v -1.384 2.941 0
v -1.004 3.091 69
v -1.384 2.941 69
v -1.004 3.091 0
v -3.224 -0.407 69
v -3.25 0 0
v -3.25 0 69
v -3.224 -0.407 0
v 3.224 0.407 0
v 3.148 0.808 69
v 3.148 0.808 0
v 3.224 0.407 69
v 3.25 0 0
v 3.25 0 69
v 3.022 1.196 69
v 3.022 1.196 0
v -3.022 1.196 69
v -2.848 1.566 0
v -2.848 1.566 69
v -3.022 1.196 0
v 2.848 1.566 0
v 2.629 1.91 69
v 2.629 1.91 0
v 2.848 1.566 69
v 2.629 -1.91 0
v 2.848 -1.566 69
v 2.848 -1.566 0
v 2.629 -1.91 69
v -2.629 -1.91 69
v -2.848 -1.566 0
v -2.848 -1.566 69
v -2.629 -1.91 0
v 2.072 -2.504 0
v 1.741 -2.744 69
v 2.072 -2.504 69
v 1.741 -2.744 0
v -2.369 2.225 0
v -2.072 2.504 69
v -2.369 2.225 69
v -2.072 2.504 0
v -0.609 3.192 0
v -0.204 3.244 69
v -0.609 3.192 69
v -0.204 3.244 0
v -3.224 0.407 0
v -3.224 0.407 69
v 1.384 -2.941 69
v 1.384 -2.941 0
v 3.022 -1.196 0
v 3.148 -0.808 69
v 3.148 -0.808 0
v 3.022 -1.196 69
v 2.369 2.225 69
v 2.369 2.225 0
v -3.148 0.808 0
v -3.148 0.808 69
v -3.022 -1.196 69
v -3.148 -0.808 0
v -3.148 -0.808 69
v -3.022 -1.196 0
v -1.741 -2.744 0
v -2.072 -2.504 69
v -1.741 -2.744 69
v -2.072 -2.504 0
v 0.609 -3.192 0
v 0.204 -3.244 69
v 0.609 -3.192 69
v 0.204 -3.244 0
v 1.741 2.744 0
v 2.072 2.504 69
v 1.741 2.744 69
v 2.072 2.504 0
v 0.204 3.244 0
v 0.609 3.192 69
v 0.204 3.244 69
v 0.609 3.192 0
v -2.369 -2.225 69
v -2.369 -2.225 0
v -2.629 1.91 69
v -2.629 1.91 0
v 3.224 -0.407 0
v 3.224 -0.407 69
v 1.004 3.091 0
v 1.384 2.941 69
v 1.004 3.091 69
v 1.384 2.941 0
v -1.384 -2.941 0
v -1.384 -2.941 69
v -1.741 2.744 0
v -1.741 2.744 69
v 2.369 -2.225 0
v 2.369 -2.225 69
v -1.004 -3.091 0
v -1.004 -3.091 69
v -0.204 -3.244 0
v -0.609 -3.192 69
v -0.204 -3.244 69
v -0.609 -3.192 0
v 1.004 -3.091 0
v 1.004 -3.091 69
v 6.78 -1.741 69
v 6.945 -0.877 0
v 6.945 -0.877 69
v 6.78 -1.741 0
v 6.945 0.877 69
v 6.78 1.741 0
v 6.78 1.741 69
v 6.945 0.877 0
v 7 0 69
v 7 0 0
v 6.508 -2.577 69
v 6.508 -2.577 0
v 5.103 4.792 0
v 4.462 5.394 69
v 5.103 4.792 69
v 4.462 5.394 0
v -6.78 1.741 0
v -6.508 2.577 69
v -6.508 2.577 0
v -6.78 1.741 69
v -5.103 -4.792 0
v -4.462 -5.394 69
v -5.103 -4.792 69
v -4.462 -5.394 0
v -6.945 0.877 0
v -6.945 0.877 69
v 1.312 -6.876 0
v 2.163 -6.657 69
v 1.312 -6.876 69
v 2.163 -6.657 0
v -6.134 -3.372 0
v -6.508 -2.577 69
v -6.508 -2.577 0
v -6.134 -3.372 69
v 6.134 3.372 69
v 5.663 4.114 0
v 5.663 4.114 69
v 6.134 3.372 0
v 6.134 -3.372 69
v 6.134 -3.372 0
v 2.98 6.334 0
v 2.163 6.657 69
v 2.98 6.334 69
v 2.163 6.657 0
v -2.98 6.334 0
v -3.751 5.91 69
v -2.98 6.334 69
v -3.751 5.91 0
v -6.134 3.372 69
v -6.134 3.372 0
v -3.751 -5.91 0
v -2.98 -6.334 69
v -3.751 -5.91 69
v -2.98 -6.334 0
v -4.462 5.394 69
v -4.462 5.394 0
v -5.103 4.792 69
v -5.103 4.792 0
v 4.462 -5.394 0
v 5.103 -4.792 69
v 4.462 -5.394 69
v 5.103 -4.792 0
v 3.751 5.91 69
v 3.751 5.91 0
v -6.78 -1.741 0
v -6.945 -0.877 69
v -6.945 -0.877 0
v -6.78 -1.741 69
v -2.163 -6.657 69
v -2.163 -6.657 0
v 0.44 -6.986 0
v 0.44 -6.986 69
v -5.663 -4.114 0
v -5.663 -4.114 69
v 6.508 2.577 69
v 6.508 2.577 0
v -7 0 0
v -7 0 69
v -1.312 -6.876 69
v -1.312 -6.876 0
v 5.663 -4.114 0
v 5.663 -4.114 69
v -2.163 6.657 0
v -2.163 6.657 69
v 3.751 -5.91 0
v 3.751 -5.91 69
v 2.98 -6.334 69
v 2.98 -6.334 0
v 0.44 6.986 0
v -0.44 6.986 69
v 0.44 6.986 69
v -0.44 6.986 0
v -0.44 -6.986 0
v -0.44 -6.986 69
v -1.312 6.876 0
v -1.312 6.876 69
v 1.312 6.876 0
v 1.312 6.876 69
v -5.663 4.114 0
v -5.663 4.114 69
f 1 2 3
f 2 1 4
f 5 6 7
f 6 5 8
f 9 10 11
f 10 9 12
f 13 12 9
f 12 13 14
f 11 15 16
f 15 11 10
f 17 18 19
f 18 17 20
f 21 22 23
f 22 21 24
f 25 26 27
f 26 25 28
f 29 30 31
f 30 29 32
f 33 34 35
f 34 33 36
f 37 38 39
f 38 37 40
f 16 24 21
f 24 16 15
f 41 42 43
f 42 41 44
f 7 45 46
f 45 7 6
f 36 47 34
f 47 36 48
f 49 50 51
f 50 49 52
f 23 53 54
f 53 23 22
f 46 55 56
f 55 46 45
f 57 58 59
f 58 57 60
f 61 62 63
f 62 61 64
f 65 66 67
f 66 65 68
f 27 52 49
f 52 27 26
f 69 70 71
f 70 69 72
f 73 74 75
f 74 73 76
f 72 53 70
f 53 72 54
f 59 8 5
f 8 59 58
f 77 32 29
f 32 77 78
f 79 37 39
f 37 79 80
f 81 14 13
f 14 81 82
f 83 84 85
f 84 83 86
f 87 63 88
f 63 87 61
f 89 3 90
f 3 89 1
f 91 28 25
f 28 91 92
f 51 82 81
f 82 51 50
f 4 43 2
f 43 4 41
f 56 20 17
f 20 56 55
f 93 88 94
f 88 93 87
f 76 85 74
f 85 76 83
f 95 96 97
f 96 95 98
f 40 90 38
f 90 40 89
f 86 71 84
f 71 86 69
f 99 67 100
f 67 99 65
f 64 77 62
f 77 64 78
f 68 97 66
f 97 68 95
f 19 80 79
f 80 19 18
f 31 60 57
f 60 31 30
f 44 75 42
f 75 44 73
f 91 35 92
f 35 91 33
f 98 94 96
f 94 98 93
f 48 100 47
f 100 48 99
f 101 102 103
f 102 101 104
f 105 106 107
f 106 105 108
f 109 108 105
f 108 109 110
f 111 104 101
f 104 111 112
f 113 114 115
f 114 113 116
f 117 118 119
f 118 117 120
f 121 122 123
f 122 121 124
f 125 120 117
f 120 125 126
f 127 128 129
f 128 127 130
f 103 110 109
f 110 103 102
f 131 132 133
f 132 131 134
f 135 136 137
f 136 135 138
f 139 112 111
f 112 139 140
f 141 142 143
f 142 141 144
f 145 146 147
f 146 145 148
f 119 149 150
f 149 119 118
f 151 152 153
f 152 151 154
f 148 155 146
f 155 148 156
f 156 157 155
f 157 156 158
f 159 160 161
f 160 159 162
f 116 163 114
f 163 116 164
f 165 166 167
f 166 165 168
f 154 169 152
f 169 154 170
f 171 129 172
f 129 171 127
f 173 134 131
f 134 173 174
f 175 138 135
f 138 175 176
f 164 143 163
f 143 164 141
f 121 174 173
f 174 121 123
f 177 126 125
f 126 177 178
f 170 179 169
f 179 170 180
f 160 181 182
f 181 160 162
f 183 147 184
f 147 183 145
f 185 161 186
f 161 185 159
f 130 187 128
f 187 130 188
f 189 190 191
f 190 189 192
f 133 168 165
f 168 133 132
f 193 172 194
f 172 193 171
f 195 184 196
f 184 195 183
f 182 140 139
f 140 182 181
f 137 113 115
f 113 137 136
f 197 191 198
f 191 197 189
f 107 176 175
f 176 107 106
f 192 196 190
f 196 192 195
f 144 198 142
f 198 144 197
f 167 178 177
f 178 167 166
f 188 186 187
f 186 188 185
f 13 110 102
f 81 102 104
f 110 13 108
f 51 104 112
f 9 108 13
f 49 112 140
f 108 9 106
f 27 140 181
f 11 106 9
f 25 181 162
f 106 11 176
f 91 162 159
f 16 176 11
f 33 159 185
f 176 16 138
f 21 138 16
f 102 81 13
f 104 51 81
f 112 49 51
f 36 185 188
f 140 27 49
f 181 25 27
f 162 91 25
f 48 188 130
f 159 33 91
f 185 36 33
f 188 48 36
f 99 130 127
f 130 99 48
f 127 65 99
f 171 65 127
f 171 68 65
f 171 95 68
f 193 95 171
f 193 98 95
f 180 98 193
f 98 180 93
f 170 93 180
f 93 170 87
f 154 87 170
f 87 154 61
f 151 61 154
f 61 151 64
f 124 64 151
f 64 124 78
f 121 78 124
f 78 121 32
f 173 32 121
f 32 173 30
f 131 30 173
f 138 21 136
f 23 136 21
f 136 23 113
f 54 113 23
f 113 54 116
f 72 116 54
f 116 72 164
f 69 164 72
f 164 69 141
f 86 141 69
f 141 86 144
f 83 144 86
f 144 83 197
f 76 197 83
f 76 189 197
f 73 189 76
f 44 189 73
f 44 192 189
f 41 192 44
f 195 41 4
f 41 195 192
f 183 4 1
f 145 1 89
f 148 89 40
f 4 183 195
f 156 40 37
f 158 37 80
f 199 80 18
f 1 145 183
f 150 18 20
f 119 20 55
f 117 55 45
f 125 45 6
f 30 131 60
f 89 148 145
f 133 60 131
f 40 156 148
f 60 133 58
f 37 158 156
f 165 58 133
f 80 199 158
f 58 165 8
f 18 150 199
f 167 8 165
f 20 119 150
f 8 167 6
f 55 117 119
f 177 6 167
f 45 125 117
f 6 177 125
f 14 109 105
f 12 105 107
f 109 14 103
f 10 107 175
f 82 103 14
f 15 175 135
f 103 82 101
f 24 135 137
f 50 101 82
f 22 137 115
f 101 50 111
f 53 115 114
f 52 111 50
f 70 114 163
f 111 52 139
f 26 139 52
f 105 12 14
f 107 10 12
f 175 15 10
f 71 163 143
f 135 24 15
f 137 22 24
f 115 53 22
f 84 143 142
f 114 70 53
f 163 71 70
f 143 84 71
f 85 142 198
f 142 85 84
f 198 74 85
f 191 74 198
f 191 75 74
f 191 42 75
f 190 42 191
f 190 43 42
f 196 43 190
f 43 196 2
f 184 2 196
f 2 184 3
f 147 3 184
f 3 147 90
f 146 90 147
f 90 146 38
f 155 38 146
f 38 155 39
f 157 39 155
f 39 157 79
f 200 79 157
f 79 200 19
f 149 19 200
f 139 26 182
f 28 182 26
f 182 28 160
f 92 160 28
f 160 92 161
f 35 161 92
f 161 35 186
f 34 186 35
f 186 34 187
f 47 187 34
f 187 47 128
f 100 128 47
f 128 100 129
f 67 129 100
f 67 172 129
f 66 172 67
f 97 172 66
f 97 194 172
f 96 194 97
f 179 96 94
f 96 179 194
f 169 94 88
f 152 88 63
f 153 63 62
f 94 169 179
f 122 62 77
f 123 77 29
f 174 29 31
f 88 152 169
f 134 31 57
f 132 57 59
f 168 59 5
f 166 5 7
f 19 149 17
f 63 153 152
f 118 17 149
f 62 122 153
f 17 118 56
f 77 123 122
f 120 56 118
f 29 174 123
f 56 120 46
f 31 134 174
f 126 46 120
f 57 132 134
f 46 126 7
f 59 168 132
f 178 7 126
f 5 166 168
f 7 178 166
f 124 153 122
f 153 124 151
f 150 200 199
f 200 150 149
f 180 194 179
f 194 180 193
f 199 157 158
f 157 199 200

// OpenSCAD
$fn = 50;


difference() {
	union() {
		cylinder(h = 69, r = 7.0000000000);
	}
	union() {
		translate(v = [0, 0, -100]) {
			cylinder(h = 200, r = 3.2500000000);
		}
		translate(v = [0, 0, -100]) {
			cylinder(h = 200, r = 1.8000000000);
		}
	}
}
